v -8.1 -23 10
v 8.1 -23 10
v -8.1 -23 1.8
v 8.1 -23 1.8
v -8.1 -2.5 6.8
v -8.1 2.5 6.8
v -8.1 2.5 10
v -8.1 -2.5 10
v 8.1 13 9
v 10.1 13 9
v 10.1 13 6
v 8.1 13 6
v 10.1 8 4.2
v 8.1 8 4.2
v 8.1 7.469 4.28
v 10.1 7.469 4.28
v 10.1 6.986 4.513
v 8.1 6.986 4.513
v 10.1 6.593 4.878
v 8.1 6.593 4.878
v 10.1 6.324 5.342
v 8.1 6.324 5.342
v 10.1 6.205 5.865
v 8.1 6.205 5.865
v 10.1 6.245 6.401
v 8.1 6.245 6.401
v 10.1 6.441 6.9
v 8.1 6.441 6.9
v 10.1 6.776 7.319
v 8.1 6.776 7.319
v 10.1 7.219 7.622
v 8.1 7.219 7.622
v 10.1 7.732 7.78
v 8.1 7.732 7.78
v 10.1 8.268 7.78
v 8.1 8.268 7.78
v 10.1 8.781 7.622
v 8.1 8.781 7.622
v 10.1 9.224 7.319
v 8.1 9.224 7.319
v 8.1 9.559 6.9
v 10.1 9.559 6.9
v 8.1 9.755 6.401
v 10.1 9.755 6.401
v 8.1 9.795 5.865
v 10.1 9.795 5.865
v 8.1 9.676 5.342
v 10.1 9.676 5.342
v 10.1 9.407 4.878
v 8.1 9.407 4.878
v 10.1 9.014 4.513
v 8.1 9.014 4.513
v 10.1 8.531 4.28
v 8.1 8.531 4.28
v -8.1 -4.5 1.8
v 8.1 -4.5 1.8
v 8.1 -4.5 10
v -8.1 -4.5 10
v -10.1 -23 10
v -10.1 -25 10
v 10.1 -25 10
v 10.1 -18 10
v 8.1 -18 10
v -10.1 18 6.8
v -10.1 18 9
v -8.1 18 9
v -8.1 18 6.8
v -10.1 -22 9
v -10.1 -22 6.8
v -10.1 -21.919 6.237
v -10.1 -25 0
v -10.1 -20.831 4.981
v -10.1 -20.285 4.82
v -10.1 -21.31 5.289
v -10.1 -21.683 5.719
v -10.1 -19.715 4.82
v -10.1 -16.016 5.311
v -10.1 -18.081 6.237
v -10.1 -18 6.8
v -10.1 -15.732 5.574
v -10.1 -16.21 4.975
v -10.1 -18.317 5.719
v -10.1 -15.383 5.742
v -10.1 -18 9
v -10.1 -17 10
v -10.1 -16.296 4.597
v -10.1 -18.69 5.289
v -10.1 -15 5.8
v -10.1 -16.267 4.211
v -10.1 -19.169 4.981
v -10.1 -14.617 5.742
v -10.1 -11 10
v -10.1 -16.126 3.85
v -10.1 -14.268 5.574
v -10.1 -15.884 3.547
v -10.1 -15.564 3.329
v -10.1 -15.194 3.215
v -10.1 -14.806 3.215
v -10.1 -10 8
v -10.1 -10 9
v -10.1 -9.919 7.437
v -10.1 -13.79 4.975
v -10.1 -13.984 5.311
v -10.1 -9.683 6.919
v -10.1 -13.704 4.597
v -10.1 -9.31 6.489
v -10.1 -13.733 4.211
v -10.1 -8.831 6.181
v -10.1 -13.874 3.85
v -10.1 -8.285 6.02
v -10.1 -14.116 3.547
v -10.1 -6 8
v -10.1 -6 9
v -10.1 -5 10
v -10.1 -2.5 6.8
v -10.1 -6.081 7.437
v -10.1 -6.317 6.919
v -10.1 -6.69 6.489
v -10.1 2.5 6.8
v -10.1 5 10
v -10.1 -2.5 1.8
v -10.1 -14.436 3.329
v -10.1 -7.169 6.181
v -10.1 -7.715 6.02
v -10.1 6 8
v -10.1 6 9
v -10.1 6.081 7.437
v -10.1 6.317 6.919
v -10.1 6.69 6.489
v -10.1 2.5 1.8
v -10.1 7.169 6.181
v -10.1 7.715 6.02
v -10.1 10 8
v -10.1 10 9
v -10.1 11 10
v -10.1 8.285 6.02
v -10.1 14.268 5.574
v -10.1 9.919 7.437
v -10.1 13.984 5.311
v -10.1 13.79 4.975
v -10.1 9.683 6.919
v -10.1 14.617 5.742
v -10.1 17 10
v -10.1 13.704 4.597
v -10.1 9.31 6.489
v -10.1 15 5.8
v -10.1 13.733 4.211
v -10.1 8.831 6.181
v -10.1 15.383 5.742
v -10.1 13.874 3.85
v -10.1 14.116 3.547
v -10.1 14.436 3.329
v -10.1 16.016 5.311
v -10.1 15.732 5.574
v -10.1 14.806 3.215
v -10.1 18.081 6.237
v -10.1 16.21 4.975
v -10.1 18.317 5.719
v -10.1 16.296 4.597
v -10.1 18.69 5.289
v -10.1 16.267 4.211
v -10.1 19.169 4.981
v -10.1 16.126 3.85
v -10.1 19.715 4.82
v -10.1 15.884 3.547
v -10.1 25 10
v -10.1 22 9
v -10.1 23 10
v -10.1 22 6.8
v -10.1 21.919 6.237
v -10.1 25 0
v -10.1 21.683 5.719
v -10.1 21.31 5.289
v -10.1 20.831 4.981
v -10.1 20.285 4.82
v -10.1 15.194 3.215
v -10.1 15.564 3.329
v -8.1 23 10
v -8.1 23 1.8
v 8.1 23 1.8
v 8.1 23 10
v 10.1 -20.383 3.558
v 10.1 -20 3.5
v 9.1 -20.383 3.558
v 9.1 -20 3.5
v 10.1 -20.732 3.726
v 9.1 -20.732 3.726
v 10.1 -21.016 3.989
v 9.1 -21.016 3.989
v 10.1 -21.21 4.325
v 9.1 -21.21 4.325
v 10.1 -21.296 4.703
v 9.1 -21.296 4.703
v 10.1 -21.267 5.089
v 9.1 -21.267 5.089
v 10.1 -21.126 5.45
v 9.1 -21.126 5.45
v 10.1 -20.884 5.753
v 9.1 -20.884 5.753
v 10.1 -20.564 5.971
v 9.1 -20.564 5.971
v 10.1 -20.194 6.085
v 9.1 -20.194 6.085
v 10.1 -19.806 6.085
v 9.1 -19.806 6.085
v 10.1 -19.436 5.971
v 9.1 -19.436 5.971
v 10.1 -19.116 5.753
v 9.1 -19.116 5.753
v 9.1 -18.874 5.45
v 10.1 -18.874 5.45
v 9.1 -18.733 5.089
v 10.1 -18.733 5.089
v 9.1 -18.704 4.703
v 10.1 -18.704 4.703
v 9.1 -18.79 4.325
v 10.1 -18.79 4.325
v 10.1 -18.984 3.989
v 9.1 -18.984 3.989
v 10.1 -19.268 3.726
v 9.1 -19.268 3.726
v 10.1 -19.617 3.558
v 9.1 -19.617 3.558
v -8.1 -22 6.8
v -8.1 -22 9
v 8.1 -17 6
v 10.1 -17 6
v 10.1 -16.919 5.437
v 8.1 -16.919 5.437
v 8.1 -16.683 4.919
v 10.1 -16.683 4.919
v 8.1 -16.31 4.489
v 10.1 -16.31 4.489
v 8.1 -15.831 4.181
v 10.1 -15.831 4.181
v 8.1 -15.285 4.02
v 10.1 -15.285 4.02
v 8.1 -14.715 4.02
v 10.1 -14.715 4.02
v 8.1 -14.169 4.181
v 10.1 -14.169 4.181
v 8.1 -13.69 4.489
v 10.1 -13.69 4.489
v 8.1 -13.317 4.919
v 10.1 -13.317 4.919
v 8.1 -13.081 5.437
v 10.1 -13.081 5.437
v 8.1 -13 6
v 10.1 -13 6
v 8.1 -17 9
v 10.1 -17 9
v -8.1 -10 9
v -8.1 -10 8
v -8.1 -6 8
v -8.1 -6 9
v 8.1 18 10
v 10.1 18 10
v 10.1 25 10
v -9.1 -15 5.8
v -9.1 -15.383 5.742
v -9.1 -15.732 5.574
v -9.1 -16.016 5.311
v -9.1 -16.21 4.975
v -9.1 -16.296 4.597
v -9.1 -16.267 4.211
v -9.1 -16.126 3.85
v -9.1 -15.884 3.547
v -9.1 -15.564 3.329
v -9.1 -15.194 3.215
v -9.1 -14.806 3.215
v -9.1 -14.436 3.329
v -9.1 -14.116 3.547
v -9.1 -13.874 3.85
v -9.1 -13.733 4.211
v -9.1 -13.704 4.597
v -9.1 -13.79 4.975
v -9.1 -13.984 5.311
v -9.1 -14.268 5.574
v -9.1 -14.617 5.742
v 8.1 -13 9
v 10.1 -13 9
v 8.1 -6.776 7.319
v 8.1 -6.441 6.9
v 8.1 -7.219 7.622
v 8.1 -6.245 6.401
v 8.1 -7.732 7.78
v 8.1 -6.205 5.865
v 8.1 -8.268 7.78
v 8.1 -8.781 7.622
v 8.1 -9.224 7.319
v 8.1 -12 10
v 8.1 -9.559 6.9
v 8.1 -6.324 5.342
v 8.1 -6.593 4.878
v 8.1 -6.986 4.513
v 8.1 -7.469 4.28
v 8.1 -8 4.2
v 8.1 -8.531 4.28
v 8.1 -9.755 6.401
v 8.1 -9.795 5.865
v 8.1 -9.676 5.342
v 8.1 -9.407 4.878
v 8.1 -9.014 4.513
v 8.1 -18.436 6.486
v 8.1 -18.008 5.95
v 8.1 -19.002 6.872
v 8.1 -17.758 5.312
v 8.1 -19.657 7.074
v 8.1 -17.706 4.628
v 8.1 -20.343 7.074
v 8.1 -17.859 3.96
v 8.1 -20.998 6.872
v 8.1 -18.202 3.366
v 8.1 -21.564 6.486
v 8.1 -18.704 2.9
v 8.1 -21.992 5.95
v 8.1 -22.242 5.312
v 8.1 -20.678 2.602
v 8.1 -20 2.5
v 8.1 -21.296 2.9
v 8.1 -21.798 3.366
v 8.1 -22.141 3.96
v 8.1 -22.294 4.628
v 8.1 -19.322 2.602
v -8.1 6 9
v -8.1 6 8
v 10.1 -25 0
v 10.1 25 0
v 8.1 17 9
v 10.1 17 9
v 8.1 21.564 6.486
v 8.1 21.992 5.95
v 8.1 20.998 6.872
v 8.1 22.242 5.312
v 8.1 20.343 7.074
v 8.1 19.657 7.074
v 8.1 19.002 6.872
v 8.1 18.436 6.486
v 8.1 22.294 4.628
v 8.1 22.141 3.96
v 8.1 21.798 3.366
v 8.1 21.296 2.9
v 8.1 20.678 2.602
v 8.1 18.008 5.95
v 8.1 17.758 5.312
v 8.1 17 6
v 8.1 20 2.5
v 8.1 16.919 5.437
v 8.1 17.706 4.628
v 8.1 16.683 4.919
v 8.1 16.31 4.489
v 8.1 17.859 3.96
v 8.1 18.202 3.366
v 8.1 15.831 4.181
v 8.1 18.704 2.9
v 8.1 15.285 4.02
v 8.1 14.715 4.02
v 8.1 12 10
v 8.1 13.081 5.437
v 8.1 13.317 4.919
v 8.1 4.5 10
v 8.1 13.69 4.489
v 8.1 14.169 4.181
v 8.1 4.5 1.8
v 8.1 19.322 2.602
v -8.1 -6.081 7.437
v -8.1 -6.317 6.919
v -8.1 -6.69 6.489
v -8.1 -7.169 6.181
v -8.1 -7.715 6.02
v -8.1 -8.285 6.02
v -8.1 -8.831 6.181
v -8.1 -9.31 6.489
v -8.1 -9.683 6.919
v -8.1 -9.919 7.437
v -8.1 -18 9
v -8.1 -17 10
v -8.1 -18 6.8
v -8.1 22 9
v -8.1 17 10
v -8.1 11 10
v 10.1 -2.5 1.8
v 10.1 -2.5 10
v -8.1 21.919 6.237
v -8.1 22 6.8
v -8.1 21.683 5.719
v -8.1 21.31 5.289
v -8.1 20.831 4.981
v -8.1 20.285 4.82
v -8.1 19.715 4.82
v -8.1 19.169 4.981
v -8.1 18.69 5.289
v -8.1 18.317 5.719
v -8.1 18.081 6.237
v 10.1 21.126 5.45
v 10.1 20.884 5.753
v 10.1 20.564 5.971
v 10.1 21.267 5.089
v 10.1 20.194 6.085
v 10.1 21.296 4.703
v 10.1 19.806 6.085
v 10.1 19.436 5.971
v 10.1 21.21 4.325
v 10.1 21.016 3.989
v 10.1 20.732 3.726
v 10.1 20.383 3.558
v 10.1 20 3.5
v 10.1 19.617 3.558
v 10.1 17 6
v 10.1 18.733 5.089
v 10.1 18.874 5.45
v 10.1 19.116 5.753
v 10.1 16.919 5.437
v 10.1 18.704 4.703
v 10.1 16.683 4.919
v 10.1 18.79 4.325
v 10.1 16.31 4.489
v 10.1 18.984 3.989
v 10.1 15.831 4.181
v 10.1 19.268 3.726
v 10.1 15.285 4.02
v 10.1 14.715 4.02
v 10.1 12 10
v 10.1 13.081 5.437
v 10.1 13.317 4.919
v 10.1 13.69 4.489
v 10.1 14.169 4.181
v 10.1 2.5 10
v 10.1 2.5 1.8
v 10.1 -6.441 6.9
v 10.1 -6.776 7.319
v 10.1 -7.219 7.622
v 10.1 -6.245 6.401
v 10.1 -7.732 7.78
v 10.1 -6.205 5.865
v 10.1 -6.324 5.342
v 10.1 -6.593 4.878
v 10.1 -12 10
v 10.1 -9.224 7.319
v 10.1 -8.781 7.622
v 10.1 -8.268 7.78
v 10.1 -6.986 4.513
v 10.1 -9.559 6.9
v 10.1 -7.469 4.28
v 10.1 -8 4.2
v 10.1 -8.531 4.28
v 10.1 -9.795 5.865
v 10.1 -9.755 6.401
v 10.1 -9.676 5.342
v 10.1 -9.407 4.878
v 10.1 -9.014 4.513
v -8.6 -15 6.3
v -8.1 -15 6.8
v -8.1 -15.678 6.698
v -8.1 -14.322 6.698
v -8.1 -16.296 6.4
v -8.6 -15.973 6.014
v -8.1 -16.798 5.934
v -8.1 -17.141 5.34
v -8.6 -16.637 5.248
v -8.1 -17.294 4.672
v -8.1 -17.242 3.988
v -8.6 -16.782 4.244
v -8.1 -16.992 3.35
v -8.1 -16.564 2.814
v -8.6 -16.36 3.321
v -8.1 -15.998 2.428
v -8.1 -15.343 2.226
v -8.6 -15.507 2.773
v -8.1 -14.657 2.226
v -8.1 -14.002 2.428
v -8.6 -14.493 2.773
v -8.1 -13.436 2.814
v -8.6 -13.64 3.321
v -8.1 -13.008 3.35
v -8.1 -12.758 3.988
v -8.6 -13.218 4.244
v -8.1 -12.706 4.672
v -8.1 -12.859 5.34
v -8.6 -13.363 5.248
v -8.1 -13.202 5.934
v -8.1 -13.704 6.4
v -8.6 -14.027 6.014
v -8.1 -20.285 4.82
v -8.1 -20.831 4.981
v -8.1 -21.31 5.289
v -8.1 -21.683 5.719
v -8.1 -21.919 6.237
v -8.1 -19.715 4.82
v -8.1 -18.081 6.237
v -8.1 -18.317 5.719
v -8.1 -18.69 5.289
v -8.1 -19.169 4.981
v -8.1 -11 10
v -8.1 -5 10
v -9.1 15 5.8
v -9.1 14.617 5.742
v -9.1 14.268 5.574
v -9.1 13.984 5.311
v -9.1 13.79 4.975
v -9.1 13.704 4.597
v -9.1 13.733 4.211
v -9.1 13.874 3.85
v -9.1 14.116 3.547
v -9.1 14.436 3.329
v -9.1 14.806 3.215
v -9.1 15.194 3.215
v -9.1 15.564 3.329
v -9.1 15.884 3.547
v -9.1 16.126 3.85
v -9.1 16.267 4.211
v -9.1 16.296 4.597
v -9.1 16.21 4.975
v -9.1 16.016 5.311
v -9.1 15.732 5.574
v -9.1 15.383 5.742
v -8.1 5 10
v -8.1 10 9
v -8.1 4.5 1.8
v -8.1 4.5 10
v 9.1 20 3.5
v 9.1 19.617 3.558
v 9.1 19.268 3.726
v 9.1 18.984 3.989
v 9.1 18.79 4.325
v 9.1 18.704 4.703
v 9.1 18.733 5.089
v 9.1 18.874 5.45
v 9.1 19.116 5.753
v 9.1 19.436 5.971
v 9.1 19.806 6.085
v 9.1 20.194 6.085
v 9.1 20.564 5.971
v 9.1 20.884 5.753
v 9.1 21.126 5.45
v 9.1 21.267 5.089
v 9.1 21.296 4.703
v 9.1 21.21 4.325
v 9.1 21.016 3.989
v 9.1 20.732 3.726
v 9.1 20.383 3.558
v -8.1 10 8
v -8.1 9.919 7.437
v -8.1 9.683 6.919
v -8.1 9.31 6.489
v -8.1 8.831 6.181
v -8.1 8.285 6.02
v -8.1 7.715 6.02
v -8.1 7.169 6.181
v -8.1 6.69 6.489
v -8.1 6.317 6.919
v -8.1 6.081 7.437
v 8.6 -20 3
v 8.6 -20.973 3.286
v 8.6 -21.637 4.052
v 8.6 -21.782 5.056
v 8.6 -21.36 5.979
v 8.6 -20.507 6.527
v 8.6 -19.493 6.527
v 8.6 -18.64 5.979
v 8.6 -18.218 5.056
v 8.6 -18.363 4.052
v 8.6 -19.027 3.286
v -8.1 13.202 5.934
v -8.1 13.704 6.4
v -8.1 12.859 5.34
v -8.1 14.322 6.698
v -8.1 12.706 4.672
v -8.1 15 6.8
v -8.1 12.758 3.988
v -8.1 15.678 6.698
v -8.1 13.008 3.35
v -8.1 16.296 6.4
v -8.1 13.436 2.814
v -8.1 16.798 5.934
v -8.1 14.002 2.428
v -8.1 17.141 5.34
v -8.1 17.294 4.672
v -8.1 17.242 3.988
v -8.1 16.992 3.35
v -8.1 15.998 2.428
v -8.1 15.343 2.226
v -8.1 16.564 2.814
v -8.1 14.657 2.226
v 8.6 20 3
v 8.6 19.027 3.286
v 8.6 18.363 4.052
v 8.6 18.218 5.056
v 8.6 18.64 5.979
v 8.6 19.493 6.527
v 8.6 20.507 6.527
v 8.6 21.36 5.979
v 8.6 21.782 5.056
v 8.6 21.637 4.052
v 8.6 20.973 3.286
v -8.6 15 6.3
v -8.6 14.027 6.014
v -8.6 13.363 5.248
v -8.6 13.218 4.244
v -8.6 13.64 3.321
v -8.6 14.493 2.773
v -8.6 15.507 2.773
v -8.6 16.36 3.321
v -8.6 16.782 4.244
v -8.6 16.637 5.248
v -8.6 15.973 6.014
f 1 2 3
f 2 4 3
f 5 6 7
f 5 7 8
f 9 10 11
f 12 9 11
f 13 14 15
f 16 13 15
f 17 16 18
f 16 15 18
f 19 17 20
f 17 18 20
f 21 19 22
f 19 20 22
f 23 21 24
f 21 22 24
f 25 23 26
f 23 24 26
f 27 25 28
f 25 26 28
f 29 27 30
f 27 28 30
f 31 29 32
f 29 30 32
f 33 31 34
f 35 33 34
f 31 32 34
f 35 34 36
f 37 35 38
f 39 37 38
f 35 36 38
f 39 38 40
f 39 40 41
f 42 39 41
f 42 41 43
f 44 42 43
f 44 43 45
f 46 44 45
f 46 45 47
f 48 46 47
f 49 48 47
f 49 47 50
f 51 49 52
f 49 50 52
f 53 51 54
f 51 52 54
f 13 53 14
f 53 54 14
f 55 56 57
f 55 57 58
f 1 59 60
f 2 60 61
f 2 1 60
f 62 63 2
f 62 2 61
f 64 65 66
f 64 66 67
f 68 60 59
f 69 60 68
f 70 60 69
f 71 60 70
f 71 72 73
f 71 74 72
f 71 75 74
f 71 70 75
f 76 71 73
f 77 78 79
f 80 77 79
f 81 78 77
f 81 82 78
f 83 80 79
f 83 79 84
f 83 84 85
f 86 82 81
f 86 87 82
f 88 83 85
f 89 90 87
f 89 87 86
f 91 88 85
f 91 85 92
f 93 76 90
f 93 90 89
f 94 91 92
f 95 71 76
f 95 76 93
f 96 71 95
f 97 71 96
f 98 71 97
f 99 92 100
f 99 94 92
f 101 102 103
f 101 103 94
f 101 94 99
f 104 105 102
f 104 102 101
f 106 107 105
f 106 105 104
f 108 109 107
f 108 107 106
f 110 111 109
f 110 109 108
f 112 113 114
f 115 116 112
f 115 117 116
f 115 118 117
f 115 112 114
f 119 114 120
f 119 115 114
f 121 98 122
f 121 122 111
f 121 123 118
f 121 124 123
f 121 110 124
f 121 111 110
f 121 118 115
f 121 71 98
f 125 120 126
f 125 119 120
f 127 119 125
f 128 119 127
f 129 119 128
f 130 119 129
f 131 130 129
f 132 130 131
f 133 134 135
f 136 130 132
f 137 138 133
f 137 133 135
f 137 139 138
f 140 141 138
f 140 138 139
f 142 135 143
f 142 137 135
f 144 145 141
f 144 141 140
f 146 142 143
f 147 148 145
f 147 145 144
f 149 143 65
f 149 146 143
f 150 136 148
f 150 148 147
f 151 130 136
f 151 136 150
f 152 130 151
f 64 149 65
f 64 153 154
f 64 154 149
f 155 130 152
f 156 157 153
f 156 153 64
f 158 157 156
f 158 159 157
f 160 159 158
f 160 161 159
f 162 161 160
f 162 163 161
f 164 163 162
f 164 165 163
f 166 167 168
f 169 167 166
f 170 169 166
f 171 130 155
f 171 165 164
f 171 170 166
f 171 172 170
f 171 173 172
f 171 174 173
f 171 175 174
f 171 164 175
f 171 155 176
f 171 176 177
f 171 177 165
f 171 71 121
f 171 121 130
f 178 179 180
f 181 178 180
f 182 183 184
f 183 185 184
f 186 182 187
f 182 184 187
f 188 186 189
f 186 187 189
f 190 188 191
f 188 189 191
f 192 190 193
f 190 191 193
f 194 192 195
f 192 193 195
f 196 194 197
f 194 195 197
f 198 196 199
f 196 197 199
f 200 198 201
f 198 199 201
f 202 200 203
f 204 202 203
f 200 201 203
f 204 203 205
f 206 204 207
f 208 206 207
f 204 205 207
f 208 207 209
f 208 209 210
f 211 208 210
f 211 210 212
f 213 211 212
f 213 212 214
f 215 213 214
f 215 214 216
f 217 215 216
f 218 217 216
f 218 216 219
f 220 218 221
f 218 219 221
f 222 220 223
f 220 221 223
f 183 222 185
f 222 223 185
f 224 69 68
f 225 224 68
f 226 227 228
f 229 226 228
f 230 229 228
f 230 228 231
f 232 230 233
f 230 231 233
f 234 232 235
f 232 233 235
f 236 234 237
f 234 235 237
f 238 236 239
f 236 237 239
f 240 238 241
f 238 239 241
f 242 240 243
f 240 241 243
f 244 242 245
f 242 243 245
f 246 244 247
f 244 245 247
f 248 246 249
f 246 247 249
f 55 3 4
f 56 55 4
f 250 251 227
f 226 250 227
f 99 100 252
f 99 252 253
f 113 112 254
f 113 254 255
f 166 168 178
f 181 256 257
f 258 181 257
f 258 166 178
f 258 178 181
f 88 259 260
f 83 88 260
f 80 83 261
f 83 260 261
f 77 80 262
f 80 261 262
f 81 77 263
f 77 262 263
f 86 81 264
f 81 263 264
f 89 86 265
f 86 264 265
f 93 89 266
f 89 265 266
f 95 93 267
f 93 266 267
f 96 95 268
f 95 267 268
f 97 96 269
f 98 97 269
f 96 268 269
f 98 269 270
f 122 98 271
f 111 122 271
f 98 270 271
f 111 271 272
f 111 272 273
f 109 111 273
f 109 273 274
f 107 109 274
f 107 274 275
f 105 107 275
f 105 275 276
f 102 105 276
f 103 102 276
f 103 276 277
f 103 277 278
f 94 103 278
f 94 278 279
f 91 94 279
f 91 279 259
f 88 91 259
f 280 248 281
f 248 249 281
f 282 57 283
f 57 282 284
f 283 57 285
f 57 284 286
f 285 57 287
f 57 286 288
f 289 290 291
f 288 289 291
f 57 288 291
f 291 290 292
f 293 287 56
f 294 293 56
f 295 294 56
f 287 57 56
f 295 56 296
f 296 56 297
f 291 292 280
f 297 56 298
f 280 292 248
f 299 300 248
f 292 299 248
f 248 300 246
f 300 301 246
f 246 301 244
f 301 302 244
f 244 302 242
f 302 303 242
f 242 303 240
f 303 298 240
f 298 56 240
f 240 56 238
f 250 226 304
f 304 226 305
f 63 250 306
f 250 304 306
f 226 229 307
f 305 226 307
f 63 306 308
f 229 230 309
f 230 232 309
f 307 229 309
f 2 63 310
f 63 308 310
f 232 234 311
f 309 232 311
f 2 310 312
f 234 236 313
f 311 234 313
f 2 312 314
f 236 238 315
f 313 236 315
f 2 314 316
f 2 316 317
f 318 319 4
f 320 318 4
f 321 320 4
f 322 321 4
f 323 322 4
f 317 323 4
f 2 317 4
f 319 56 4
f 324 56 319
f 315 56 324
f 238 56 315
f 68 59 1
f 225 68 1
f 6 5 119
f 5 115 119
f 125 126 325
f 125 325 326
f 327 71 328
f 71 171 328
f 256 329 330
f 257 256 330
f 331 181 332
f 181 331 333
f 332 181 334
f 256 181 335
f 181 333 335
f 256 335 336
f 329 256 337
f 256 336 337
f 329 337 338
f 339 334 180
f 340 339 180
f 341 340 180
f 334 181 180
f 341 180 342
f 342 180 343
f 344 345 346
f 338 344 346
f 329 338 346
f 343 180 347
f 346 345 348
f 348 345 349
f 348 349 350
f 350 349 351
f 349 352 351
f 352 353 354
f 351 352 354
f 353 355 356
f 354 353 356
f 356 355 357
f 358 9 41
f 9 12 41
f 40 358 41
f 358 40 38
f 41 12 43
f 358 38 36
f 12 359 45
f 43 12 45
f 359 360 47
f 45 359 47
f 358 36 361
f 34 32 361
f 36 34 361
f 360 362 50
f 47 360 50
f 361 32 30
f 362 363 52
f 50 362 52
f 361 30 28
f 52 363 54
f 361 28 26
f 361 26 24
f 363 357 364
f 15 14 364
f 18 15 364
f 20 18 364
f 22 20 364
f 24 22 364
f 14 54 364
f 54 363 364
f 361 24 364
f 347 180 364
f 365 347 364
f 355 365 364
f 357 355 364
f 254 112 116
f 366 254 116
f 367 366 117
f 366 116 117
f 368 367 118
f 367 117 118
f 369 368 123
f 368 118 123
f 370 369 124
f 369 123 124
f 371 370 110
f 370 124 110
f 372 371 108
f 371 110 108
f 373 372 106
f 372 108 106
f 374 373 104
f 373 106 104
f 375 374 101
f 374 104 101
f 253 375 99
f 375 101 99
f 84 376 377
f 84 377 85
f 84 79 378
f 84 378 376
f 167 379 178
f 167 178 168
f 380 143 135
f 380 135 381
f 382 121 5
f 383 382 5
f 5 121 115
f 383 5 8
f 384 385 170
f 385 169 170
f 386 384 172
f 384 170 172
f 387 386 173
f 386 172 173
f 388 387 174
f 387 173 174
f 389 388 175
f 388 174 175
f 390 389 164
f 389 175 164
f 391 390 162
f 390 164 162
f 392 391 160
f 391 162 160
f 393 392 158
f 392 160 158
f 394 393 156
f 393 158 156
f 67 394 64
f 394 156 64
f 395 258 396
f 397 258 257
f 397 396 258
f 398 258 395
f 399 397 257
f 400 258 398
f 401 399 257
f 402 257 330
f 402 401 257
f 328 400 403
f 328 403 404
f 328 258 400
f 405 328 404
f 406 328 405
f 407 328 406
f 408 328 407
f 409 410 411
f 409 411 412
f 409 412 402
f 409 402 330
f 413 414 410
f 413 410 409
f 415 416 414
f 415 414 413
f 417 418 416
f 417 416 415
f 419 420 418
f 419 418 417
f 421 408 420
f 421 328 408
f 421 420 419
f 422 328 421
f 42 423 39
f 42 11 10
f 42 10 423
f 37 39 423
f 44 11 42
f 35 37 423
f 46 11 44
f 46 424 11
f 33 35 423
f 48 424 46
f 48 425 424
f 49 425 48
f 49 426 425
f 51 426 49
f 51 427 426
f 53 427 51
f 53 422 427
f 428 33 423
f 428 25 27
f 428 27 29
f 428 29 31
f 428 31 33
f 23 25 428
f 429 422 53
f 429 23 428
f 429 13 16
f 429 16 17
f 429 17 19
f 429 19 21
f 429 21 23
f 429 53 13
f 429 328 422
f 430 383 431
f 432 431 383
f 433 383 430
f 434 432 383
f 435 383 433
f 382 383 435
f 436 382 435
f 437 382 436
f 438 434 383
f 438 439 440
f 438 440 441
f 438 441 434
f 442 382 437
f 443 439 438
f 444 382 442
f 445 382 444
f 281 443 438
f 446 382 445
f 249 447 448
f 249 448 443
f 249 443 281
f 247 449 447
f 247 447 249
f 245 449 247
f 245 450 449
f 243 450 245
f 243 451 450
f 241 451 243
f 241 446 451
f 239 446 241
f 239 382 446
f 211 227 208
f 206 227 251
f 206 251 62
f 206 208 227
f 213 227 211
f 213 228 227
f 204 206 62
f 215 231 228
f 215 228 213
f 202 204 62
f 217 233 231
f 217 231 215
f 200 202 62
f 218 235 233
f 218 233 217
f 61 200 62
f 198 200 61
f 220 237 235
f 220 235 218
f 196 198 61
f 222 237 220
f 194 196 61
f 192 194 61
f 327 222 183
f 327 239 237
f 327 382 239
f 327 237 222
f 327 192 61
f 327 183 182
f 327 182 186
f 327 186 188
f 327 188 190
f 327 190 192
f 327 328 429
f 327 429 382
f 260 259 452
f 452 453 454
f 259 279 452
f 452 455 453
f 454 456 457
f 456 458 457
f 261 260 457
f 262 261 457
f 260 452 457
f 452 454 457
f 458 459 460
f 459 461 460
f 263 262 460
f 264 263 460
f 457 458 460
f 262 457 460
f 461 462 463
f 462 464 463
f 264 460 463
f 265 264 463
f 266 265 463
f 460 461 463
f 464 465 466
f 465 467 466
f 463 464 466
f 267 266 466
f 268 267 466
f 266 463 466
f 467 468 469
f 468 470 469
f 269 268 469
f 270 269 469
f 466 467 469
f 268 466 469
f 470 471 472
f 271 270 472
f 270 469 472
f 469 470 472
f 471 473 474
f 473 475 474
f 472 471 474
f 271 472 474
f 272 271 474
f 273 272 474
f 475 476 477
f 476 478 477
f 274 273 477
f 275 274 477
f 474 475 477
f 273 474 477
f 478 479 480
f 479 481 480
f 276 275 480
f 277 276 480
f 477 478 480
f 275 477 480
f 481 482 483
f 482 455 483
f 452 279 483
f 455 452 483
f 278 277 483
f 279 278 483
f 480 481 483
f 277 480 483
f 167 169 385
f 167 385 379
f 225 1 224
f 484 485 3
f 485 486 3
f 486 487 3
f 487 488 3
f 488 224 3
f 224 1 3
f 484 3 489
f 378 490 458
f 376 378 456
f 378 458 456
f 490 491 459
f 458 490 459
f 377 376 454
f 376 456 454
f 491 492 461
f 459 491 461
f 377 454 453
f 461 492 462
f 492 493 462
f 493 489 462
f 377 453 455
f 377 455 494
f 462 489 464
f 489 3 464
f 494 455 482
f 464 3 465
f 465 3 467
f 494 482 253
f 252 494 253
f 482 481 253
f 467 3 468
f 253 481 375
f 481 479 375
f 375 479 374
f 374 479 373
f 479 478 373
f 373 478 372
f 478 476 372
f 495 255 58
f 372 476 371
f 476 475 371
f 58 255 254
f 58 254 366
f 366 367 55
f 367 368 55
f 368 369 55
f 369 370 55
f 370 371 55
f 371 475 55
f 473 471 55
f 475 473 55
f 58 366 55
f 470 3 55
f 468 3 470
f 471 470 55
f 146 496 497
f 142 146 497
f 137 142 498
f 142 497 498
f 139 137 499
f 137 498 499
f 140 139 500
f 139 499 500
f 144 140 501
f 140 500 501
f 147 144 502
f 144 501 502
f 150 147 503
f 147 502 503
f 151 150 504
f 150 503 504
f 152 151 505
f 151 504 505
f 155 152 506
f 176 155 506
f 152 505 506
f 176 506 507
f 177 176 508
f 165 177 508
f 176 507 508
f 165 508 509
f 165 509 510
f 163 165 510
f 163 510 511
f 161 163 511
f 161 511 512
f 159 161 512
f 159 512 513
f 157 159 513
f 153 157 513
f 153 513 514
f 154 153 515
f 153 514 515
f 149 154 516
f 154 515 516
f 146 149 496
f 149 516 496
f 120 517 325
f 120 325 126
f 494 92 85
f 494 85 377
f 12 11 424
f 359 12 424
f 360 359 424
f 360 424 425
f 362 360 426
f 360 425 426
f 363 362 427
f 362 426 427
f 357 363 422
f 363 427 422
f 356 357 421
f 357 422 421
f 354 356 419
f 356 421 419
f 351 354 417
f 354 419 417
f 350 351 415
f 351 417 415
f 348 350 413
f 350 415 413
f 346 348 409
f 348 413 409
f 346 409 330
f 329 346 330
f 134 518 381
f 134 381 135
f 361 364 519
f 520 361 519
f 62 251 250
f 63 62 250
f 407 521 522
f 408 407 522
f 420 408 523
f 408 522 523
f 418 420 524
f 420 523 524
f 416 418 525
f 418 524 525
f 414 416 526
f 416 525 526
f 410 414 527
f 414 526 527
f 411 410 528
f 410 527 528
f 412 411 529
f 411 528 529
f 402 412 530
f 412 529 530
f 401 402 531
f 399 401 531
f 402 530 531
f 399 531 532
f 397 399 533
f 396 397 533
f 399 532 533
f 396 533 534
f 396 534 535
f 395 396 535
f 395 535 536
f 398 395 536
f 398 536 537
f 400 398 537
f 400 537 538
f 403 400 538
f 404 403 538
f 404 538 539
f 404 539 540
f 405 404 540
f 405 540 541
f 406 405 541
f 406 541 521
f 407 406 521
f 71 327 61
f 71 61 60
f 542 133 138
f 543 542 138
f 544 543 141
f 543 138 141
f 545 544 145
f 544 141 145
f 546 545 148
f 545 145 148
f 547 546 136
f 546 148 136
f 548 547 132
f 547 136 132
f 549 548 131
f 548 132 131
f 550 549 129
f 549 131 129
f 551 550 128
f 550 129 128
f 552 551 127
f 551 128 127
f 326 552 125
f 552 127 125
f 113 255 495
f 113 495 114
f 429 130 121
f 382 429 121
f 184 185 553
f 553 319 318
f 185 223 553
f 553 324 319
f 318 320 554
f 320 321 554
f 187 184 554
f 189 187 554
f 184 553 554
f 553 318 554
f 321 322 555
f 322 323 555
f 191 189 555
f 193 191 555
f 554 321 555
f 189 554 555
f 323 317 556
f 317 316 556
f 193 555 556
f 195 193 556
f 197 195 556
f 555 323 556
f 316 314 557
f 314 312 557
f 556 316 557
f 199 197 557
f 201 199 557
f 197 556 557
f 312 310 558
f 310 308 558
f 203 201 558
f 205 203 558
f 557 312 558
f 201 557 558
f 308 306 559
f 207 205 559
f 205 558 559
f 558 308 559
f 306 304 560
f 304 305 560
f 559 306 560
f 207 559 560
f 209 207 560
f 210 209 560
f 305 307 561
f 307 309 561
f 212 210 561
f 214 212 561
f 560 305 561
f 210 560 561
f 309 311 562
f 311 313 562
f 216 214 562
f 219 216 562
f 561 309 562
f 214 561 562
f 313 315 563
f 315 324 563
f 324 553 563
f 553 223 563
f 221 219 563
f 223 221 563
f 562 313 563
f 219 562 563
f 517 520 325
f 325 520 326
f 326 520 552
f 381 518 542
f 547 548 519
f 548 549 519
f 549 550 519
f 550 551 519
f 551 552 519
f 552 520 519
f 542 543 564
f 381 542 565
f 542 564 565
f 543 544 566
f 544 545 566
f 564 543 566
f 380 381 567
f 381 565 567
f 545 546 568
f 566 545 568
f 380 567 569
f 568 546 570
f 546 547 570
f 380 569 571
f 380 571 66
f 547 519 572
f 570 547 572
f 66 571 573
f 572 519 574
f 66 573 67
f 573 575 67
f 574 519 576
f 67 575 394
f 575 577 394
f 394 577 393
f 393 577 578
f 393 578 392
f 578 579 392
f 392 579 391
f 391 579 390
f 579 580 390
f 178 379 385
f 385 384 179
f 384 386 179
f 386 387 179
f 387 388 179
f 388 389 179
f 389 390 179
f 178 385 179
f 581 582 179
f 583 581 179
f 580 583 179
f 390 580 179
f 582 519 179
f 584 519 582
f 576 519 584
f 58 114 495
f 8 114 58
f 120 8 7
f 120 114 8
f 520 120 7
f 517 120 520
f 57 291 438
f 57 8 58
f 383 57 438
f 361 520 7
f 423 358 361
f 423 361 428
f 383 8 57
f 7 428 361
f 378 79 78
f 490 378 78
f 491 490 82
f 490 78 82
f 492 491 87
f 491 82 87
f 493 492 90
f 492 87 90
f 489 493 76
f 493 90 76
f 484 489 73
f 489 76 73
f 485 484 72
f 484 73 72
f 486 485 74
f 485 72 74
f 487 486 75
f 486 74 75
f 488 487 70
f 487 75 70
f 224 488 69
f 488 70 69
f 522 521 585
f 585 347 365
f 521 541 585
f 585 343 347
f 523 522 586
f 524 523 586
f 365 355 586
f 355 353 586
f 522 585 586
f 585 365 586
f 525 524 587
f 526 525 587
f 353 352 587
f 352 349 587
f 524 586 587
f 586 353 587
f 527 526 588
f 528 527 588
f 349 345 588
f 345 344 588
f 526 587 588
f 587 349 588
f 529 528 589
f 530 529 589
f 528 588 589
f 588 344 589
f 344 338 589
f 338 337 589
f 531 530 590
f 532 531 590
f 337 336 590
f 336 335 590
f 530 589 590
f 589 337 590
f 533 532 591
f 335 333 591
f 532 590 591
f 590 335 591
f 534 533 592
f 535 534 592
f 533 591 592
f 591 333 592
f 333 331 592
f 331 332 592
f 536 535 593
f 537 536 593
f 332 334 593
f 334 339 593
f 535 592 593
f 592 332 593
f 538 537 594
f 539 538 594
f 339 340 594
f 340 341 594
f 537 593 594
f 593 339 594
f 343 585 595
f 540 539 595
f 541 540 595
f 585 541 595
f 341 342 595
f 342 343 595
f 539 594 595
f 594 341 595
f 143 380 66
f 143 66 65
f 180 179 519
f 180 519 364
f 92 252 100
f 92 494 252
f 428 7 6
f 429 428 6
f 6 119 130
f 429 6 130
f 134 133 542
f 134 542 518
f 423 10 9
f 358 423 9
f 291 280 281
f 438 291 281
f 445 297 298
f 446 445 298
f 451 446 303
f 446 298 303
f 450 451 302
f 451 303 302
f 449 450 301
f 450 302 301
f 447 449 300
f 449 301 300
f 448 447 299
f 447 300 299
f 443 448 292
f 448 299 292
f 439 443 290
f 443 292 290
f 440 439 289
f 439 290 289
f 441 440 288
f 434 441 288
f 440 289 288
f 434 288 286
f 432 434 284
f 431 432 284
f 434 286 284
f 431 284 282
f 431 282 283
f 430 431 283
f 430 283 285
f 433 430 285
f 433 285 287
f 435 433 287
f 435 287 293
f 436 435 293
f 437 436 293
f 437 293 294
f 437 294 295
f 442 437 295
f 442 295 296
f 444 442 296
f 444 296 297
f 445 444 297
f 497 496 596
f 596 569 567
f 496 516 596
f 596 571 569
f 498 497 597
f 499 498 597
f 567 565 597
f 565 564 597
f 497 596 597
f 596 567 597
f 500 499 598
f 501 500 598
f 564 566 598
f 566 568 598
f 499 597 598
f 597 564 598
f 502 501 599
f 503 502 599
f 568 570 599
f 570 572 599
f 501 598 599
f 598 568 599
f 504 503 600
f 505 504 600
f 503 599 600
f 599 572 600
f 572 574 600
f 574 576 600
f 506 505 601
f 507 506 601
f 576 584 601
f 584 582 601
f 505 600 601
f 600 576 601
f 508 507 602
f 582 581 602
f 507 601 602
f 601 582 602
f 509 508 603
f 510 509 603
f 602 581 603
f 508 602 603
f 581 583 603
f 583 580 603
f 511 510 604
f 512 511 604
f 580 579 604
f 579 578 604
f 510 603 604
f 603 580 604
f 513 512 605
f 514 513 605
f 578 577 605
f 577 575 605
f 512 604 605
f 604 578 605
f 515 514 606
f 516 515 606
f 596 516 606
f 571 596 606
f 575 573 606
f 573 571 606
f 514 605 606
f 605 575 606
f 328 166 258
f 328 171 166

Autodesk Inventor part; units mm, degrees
ref_plane "YZ Plane" through (0, 0, 0) normal (1, 0, 0) x (0, 1, 0)
ref_plane "XZ Plane" through (0, 0, 0) normal (0, 1, 0) x (-1, 0, 0)
ref_plane "XY Plane" through (0, 0, 0) normal (0, 0, 1) x (1, 0, 0)
sketch "Sketch3" plane through (0, 0, 0) normal (0, 0, 1) x (1, 0, 0)
  line L0 (-10.1, 25) -> (10.1, 25)
  line L1 (10.1, 25) -> (10.1, -25)
  line L2 (10.1, -25) -> (-10.1, -25)
  line L3 (-10.1, -25) -> (-10.1, 25)
  point P0 (0, 0)
  dimension "d26" = 20.2
  dimension "d27" = 50
extrude "Extrusion3" add sketch "Sketch3" along normal blind 1.8
sketch "Sketch4" plane through (0, 0, 1.8) normal (0, 0, 1) x (1, 0, 0)
  line L0 (-8.1, 23) -> (8.1, 23)
  line L1 (8.1, -23) -> (-8.1, -23)
  line L2 (-8.1, 0) -> (-8.1, 2.5)
  line L3 (-8.1, 2.5) -> (8.1, 2.5)
  line L4 (8.1, 4.5) -> (-8.1, 4.5)
  line L5 (-8.1, 0) -> (-8.1, -2.5)
  line L6 (-8.1, -2.5) -> (8.1, -2.5)
  line L7 (8.1, -4.5) -> (-8.1, -4.5)
  line L8 (-8.1, 4.5) -> (-8.1, 23)
  line L9 (8.1, 23) -> (8.1, 4.5)
  line L10 (8.1, 2.5) -> (8.1, -2.5)
  line L11 (8.1, -4.5) -> (8.1, -23)
  line L12 (-10.1, 25) -> (-10.1, -25) projected
  line L13 (10.1, -25) -> (10.1, 25) projected
  line L14 (-10.1, 25) -> (10.1, 25)
  line L15 (10.1, 25) -> (10.1, -25)
  line L16 (10.1, -25) -> (-10.1, -25)
  line L17 (-10.1, -25) -> (-10.1, 25)
  line L18 (-8.1, -23) -> (-8.1, -4.5)
  line L19 (-8.1, -2.5) -> (-8.1, 2.5)
  point P0 (0, 0)
  dimension "d39" = 2.5
  dimension "d40" = 2.5
  dimension "d44" = 2
  dimension "d45" = 2
  dimension "d48" = 2
  dimension "d49" = 2
  dimension "d50" = 2
  dimension "d51" = 2
  dimension "d52" = 2
  dimension "d53" = 2
  dimension "d56" = 2
  dimension "d57" = 2
extrude "Extrusion4" add sketch "Sketch4" along normal blind 8.2
sketch "Sketch5" plane through (10.1, -25, 0) normal (1, 0, 0) x (0, 0, -1)
  line L0 (-1.8, 27.5) -> (-10, 27.5) projected
  line L1 (-1.8, 22.5) -> (-10, 22.5) projected
  line L2 (-10, 27.5) -> (-1.8, 27.5)
  line L3 (-1.8, 27.5) -> (-1.8, 22.5)
  line L4 (-1.8, 22.5) -> (-10, 22.5)
  line L5 (-10, 22.5) -> (-10, 27.5)
  point P0 (0, 25)
extrude "Extrusion5" cut sketch "Sketch5" against normal blind 8.2
sketch "Sketch6" plane through (-10.1, -25, 0) normal (-1, 0, 0) x (0, 0, 1)
  line L0 (1.8, 27.5) -> (1.8, 22.5) projected
  line L1 (1.8, 22.5) -> (6.8, 22.5)
  line L2 (6.8, 22.5) -> (6.8, 27.5)
  line L3 (6.8, 27.5) -> (1.8, 27.5)
  line L4 (1.8, 27.5) -> (1.8, 22.5)
  point P0 (0, 25)
  dimension "d60" = 5
  dimension "d61" = 5
extrude "Extrusion6" cut sketch "Sketch6" against normal blind 8.2
sketch "Sketch7" plane through (-10.1, -25, 0) normal (-1, 0, 0) x (0, 0, 1)
  line L0 (0, 50) -> (10, 50) projected
  line L1 (0, 0) -> (0, 50) projected
  line L2 (0, 25) -> (10, 25)
  line L3 (0, 0) -> (10, 0)
  circle A0 centre (6.8, 45) radius 2
  circle A1 centre (8, 33) radius 2
  circle A2 centre (8, 17) radius 2
  circle A3 centre (6.8, 5) radius 2
  line L4 (6.8, 7) -> (10, 7)
  line L5 (6.8, 3) -> (10, 3)
  line L6 (10, 50) -> (10, 0) projected
  line L7 (10, 7) -> (10, 3)
  line L8 (6.8, 47) -> (10, 47)
  line L9 (10, 47) -> (10, 43)
  line L10 (10, 43) -> (6.8, 43)
  line L11 (10, 29.5) -> (10, 48) projected
  line L12 (8, 35) -> (10, 35)
  line L13 (10, 35) -> (10, 31)
  line L14 (10, 31) -> (8, 31)
  line L15 (8, 31) -> (8, 35)
  line L16 (10, 20.5) -> (10, 2) projected
  line L17 (8, 19) -> (10, 19)
  line L18 (10, 19) -> (10, 15)
  line L19 (10, 15) -> (8, 15)
  line L20 (8, 15) -> (8, 19)
  point P0 (4.5, 40)
  point P1 (4.5, 10)
  dimension "d66" = 10
  dimension "d67" = 4.5
  dimension "d70" = 5
  dimension "d71" = 6.8
  dimension "d74" = 17
  dimension "d75" = 8
  dimension "d90" = 4
  dimension "d91" = 4
hole "Hole1" at (-10.1, 15, 4.5) at (-10.1, -15, 4.5) direction (1, 0, 0) diameter 2.6 depth 2 tip angle 118
extrude "Extrusion7" cut sketch "Sketch7" against normal blind 2 contours L6 L10 A0 L8 | A0 | L14 A1 L6 | L6 A2 L17 | L6 A1 L12 | L5 A3 L4 L6 | A1 L15 | A1 L15 | A2 L20 | L6 L19 A2 | L20 A2 | A3
sketch "Sketch8" plane through (10.1, -25, 0) normal (1, 0, 0) x (0, 0, -1)
  line L0 (0, 50) -> (-10, 50) projected
  circle A0 centre (-6, 40) radius 2
  circle A1 centre (-6, 10) radius 2
  line L1 (-10, 15) -> (-10, 7) projected
  line L2 (-6, 12) -> (-10, 12)
  line L3 (-10, 12) -> (-10, 8)
  line L4 (-10, 8) -> (-6, 8)
  line L5 (-6, 8) -> (-6, 12)
  line L6 (-10, 43) -> (-10, 35) projected
  line L7 (-6, 42) -> (-10, 42)
  line L8 (-10, 42) -> (-10, 38)
  line L9 (-10, 38) -> (-6, 38)
  line L10 (-6, 38) -> (-6, 42)
  point P0 (0, 25)
  point P1 (-4.8, 45)
  point P2 (-6, 33)
  point P3 (-4.8, 5)
  point P4 (-6, 17)
  dimension "d113" = 4
  dimension "d114" = 4
hole "Hole3" at (10.1, 20, 4.8) at (10.1, -20, 4.8) direction (-1, 0, 0) diameter 2.6 depth 2 tip angle 118
hole "Hole4" at (10.1, 8, 6) at (10.1, -8, 6) direction (-1, 0, 0) diameter 3.6 depth 2 tip angle 118
extrude "Extrusion8" cut sketch "Sketch8" against normal blind 2
chamfer "Chamfer1" distance 1 angle 45 12 edges at (-9.1, 22, 10) (-9.1, 18, 10) (-9.1, 10, 10) (-9.1, 6, 10) (-9.1, -6, 10) (-9.1, -10, 10) (-9.1, -18, 10) (-9.1, -22, 10) (9.1, -17, 10) (9.1, -13, 10) (9.1, 13, 10) (9.1, 17, 10)
chamfer "Chamfer3" distance 1 angle 45 4 edges at (8.1, 20, 6.1) (8.1, -20, 6.1) (-8.1, -15, 3.2) (-8.1, 15, 3.2)
properties part number "digit_holder_B_no_hole"
